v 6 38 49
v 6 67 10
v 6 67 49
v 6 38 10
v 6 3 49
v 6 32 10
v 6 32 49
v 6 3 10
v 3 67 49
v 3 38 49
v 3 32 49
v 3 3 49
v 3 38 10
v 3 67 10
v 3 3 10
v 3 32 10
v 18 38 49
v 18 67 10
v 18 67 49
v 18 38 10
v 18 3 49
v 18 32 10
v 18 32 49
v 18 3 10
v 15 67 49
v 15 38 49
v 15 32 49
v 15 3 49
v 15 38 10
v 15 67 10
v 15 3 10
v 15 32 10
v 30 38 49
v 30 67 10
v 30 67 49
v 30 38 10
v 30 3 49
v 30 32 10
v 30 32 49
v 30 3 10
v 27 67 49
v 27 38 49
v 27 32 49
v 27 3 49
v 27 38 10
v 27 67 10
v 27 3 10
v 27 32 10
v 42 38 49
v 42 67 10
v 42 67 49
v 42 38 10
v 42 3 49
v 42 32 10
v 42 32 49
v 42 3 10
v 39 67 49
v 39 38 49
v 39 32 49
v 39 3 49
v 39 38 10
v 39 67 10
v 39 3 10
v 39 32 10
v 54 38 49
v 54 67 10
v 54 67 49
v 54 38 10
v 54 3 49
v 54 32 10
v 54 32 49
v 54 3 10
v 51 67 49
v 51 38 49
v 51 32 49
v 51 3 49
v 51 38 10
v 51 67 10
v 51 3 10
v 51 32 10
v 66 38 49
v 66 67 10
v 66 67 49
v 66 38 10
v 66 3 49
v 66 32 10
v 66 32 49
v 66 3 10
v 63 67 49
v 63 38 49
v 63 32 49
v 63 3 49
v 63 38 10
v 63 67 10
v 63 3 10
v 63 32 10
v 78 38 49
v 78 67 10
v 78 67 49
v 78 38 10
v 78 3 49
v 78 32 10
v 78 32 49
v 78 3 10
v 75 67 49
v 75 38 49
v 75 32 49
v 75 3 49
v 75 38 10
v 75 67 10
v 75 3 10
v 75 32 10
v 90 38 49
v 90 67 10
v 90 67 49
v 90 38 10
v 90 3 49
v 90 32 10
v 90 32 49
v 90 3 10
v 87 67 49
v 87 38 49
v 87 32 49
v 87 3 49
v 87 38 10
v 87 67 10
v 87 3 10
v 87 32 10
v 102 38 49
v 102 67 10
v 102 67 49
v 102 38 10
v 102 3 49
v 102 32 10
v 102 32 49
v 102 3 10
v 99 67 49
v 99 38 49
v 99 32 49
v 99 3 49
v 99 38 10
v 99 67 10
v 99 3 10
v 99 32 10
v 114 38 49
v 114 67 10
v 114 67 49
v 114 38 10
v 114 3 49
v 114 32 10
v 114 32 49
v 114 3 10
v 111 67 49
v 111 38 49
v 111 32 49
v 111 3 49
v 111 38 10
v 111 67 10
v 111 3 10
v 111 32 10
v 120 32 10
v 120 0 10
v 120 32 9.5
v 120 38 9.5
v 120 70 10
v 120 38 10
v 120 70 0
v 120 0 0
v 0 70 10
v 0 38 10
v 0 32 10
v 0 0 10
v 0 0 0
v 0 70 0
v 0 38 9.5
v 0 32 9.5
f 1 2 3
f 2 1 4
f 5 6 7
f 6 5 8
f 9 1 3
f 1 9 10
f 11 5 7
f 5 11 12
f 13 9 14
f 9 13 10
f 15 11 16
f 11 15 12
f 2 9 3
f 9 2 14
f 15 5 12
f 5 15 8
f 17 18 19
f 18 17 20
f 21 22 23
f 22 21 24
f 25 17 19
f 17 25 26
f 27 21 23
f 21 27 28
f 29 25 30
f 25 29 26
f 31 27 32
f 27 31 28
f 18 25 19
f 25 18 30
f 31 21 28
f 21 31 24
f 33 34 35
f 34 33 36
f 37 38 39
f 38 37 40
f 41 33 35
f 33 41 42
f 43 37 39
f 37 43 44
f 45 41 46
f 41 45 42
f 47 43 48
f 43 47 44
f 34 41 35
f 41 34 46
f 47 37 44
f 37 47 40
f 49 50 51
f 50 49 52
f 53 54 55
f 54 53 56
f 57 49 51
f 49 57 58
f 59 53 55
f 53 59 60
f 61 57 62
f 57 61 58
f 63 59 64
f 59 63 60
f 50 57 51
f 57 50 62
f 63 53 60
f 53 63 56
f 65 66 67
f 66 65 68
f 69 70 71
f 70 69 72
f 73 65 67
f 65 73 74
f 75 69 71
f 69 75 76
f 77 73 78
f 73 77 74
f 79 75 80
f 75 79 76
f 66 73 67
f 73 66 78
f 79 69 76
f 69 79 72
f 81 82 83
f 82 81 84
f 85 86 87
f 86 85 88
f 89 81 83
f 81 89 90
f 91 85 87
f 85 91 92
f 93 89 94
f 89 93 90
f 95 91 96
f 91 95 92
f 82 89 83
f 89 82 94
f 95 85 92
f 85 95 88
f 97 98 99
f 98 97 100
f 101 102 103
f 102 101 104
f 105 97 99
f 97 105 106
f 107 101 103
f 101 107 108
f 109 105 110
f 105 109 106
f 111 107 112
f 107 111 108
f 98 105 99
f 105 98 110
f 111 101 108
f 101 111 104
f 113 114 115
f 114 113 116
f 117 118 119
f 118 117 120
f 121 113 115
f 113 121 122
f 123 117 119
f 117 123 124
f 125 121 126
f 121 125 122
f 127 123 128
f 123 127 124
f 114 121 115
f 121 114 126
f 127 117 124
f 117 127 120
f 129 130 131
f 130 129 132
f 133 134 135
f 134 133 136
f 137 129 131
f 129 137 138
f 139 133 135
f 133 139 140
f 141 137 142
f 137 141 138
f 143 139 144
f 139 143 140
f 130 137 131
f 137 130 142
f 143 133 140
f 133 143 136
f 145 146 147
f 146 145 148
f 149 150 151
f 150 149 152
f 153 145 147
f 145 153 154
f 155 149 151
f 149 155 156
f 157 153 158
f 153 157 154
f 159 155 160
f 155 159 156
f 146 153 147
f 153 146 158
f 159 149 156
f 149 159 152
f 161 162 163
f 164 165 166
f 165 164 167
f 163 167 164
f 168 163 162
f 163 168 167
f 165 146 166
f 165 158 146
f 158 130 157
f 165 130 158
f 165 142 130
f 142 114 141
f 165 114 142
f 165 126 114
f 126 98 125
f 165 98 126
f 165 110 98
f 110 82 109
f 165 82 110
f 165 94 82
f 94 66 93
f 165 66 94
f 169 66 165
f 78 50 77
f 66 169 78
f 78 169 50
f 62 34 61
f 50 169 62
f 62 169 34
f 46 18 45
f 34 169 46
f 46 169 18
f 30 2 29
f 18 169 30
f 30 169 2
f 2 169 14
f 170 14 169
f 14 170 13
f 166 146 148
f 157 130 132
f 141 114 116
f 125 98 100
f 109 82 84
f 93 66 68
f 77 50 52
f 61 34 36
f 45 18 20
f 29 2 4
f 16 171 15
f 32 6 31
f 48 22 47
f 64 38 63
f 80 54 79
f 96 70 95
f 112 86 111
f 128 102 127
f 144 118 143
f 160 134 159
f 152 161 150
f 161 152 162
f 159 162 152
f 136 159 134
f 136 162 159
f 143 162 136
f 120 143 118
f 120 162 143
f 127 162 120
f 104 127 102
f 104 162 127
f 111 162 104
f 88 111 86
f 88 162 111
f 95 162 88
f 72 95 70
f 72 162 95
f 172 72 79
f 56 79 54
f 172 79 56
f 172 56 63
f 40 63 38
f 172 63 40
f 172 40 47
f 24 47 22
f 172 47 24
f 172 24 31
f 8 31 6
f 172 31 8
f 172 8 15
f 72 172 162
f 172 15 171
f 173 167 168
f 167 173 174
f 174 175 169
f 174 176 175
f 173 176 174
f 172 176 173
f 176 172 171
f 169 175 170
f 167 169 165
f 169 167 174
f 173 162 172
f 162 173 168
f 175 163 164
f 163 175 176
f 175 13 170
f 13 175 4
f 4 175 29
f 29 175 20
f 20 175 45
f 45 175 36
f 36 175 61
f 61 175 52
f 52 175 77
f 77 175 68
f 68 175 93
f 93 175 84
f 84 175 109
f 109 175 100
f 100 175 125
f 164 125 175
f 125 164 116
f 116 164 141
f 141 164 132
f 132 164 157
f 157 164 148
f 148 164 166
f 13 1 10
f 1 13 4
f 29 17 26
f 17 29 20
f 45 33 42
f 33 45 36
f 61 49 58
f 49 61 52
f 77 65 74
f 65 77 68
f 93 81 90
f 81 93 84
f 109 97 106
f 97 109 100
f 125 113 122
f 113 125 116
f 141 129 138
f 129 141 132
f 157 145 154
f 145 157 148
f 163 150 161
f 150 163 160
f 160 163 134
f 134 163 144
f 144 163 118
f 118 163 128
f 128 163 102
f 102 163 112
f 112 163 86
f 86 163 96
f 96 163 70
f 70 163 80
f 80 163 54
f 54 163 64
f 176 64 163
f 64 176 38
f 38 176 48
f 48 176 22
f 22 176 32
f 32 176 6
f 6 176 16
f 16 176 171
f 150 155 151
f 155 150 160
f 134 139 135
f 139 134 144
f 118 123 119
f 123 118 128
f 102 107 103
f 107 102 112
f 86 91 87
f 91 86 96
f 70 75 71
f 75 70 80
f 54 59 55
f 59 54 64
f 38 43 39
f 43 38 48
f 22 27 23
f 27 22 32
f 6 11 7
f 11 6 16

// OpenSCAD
$fn = 32;

// ----------------------------------------------------------------------
// Heatsink: slotted fin block
// ----------------------------------------------------------------------

// --- parameters (mm) ---
base_l = 120;             // base length, X
base_w = 70;              // base width, Y
base_t = 10;              // base plate thickness
fin_h = 40;               // fin height above the base
fin_t = 3;                // fin thickness
edge = 3;                 // margin from the base ends
pitch = 12;               // fin pitch
slot_w = 6;               // central slot width, Y

n_fins = floor((base_l - 2 * edge - fin_t) / pitch) + 1;  // fin count
total_h = base_t + fin_h - 1;  // overall height

difference() {
union() {
  cube([base_l, base_w, base_t]);
  for (i = [0 : n_fins - 1])
    translate([edge + i * pitch, edge, base_t - 1])
      cube([fin_t, base_w - 2 * edge, fin_h]);
}
  translate([-1, base_w / 2 - slot_w / 2, base_t - 0.5])
    cube([base_l + 2, slot_w, fin_h + 2]);
}
